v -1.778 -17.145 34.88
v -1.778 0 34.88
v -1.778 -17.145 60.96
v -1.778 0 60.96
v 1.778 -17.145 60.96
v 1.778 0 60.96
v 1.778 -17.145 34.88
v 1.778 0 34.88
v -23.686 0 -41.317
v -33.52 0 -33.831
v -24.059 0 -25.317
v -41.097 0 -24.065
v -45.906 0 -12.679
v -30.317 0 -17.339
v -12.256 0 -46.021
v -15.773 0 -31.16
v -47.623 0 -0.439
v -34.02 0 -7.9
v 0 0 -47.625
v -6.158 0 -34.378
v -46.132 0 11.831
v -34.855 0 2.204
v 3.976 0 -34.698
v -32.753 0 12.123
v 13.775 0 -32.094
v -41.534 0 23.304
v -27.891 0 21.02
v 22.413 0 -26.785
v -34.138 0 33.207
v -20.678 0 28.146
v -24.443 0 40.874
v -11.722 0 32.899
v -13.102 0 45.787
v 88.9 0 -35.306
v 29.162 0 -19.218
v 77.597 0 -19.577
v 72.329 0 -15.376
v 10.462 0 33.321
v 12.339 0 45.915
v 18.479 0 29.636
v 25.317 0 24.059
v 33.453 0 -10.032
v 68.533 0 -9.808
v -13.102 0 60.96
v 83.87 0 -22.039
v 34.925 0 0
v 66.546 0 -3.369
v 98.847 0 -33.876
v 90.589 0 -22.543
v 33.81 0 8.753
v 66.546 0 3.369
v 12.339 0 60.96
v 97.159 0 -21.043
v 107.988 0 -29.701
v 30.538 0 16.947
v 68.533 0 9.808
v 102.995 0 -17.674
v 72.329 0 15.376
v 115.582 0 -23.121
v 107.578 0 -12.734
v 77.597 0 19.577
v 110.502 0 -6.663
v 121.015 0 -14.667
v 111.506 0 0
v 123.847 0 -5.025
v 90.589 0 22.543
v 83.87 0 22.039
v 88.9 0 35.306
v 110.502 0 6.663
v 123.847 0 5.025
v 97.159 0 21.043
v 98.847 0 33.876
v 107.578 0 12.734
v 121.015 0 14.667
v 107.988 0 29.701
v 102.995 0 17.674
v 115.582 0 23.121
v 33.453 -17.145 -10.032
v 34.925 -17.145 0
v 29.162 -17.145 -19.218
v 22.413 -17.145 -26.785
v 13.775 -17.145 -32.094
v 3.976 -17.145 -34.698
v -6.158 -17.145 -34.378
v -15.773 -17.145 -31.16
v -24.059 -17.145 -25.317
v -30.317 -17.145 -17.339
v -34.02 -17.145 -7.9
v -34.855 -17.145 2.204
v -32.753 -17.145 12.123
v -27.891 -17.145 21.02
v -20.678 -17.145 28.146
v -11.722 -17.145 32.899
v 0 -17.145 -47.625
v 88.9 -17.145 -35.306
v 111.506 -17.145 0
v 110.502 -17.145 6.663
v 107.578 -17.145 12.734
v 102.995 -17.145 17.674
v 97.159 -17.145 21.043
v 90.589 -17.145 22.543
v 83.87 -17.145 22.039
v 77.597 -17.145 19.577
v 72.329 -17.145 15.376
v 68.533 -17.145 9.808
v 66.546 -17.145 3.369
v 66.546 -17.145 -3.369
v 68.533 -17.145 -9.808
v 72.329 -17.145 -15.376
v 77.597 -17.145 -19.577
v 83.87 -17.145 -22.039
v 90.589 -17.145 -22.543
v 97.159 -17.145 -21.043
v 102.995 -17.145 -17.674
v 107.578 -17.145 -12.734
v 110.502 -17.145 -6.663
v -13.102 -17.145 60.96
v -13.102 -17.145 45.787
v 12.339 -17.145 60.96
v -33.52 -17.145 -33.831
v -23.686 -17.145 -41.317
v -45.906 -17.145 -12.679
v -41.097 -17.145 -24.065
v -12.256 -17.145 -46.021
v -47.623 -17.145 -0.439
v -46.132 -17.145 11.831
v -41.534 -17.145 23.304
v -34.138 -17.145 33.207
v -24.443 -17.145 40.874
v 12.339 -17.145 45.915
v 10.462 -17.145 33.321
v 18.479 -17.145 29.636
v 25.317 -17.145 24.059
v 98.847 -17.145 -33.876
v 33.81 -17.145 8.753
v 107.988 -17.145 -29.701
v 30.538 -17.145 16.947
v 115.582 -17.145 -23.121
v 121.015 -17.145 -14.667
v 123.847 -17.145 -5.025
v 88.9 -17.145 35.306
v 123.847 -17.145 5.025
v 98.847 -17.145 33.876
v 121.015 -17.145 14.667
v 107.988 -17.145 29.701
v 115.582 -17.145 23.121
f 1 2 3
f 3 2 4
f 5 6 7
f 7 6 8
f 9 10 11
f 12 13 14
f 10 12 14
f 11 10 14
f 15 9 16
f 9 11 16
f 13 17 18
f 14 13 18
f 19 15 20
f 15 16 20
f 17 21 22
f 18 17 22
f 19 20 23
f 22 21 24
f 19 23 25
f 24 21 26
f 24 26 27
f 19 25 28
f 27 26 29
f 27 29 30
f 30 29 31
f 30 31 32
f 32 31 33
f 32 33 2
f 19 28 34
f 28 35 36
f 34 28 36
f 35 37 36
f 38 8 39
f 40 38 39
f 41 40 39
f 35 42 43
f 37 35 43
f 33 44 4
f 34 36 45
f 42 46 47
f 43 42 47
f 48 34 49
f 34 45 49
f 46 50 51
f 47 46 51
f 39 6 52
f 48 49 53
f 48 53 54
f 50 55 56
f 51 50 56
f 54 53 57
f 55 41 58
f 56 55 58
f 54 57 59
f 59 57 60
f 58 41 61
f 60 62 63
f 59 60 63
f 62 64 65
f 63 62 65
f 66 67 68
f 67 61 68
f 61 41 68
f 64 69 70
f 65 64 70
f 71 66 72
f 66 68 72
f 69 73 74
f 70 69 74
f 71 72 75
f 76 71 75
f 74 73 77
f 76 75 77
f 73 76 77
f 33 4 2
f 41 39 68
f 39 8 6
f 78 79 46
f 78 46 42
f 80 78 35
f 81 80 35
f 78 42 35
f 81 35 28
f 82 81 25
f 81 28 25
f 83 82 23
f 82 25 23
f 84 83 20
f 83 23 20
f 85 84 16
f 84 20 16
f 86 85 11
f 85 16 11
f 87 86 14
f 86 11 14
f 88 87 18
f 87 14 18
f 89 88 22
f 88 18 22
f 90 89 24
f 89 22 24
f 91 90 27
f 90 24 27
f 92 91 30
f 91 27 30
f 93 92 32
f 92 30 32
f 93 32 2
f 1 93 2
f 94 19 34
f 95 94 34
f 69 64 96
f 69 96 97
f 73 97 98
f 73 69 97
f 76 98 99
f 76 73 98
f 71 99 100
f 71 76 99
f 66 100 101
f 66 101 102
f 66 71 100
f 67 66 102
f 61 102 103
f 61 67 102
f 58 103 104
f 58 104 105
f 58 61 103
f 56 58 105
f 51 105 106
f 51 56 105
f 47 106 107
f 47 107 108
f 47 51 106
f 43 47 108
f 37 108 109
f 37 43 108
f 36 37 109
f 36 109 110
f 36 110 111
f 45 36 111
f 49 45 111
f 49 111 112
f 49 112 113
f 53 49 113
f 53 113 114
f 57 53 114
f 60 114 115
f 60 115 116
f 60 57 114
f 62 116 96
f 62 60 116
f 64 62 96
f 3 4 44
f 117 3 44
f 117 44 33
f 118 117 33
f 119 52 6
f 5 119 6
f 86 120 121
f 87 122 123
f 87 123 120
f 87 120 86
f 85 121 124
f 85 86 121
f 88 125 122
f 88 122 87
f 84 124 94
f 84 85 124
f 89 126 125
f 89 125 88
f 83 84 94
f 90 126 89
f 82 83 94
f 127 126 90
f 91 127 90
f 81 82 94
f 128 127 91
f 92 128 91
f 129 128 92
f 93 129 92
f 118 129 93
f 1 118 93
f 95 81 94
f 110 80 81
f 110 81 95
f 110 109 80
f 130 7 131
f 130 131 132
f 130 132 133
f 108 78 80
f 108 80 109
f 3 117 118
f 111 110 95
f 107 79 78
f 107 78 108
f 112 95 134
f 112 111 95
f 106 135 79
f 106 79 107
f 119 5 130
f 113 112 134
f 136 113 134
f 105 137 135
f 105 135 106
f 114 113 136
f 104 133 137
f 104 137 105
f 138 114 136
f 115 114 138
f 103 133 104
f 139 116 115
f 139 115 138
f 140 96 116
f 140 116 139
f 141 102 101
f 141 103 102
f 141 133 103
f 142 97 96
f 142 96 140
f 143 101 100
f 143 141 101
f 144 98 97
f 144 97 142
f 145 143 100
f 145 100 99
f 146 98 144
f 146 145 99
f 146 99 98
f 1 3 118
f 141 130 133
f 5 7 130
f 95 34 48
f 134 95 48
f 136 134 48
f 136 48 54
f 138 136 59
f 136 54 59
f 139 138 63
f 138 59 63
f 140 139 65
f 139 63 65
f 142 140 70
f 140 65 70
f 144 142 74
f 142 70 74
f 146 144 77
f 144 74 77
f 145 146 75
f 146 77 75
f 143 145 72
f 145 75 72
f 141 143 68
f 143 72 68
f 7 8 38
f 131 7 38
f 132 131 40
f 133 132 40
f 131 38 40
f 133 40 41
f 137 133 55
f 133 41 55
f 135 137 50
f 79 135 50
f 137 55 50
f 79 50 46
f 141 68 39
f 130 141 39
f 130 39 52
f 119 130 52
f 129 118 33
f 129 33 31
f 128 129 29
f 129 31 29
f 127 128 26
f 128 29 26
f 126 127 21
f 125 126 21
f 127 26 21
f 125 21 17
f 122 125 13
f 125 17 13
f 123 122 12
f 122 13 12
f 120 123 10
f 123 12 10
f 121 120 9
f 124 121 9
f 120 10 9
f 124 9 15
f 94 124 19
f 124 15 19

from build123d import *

# Parameters (mm, degrees)
F0_R     = 22.606
F1_DEPTH = 17.145


# Not quite as in the source:
# - a feature names something its author has since deleted; it is built from what else it names


with BuildPart() as f1:
    # F0 (on Front) → F1 (new body)
    with BuildSketch(Plane.XZ):
        with BuildLine():
            ThreePointArc((1.778, 34.8797124558), (25.3165190636, 24.0588754413), (34.925, 0))
            ThreePointArc((34.925, 0), (-24.0588754413, -25.3165190636), (-1.778, 34.8797124558))
            Line((-1.778, 34.8797124558), (-1.778, 47.591799094))
            ThreePointArc((-1.778, 47.591799094), (-7.4944029118, 47.0316335034), (-13.1017966196, 45.7873732631))
            ThreePointArc((-13.1017966196, 45.7873732631), (-47.1633558849, -6.6150197786), (0, -47.625))
            Line((0, -47.625), (88.9, -35.306))
            ThreePointArc((88.9, -35.306), (124.206, 0), (88.9, 35.306))
            Line((88.9, 35.306), (12.3385861516, 45.9152244904))
            Line((12.3385861516, 45.9152244904), (1.778, 47.37862))
            Line((1.778, 47.37862), (1.778, 34.8797124558))
        make_face()
        with Locations((88.9, 0)):
            Circle(F0_R, mode=Mode.SUBTRACT)
        with BuildLine():
            ThreePointArc((-13.1017966196, 45.7873732631), (-7.4944029118, 47.0316335034), (-1.778, 47.591799094))
            Line((-1.778, 47.591799094), (-1.778, 60.96))
            Line((-1.778, 60.96), (-13.1017966196, 60.96))
            Line((-13.1017966196, 60.96), (-13.1017966196, 45.7873732631))
        make_face()
        Polygon((1.778, 60.96), (1.778, 47.37862), (12.3385861516, 45.9152244904), (12.3385861516, 60.96), align=None)
    extrude(amount=F1_DEPTH)


solid = f1.part
